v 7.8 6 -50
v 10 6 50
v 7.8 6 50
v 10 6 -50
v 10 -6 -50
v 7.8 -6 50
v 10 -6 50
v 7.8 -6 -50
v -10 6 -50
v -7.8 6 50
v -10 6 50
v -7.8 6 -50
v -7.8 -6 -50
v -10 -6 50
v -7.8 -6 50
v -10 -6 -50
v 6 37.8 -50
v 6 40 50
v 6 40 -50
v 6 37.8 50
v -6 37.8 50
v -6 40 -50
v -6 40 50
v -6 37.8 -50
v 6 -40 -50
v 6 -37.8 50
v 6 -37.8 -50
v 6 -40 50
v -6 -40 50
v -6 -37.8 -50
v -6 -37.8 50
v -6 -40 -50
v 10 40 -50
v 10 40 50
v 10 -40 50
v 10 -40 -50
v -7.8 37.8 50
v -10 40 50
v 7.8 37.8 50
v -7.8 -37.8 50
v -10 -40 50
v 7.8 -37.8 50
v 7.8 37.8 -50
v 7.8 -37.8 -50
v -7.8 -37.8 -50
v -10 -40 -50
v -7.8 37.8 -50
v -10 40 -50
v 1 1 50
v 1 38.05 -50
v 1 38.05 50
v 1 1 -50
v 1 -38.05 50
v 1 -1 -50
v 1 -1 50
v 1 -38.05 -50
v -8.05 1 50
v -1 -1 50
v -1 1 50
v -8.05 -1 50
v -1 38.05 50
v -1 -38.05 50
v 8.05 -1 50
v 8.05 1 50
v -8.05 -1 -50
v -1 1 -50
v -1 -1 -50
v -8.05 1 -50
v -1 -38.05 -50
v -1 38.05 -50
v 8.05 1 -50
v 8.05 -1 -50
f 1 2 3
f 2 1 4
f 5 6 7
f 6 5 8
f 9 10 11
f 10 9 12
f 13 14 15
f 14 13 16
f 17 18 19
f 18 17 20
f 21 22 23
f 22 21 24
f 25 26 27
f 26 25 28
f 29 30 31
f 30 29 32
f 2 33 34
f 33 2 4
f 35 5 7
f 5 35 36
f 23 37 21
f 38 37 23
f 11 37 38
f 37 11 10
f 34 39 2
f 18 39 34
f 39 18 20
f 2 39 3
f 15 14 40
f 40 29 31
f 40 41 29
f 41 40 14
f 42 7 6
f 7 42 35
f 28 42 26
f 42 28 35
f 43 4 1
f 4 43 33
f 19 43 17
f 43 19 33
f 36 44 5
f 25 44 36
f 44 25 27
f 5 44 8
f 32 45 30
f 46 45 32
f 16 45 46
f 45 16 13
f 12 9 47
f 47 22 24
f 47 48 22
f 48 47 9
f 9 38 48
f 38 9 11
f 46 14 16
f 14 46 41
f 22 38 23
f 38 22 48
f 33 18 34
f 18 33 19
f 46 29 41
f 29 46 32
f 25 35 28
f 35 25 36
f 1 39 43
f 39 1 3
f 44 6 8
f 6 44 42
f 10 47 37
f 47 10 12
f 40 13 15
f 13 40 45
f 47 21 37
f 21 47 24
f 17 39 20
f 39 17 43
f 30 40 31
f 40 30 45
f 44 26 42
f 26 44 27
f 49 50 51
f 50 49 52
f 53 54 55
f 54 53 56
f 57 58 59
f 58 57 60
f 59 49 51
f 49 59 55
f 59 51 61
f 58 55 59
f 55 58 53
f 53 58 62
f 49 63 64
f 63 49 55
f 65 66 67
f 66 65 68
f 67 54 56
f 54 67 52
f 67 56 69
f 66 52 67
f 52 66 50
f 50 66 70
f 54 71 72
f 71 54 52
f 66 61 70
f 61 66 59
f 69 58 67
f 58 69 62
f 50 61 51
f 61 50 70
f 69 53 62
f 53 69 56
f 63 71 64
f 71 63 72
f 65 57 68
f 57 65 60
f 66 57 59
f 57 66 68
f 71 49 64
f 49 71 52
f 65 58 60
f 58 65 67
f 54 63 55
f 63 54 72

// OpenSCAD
// 20x80 aluminium T-slot extrusion (approximate standard profile)
// Cross-section: 20mm x 80mm, Length: 100mm
// One connected solid, no floating parts.

$fn = 96;

// Parameters (mm)
W = 20.0;     // overall width (X)
H = 80.0;     // overall height (Y)
L = 100.0;    // length (Z)

wall = 2.2;          // outer wall thickness
slot_open = 6.0;     // slot mouth opening
slot_depth = 8.0;    // depth from outer face to inner cavity
slot_cavity_w = 12.0;// undercut cavity width
slot_cavity_d = 4.0; // additional depth for cavity beyond slot_depth

center_bore_d = 6.0; // center bore diameter

web = 2.0;           // internal web thickness
overlap = 0.25;      // boolean overlap

// ---- Helpers ----
module slot_cut_x(sign=1) {
    // Cuts a T-slot on the +/-X face, running along Z
    // Mouth (narrow)
    translate([sign*(W/2 - slot_depth/2 + overlap/2), 0, 0])
        cube([slot_depth + overlap, slot_open, L + 2*overlap], center=true);

    // Undercut cavity (wide)
    translate([sign*(W/2 - (slot_depth + slot_cavity_d)/2 + overlap/2), 0, 0])
        cube([slot_depth + slot_cavity_d + overlap, slot_cavity_w, L + 2*overlap], center=true);
}

module slot_cut_y(sign=1) {
    // Cuts a T-slot on the +/-Y face, running along Z
    translate([0, sign*(H/2 - slot_depth/2 + overlap/2), 0])
        cube([slot_open, slot_depth + overlap, L + 2*overlap], center=true);

    translate([0, sign*(H/2 - (slot_depth + slot_cavity_d)/2 + overlap/2), 0])
        cube([slot_cavity_w, slot_depth + slot_cavity_d + overlap, L + 2*overlap], center=true);
}

// ---- Main profile ----
module extrusion_20x80() {
    // Build as a single unioned solid: (outer shell minus cuts) + internal webs
    union() {
        difference() {
            // Outer body (ensures visible outer rectangular boundary)
            cube([W, H, L], center=true);

            // Inner void (keeps outer walls)
            cube([W - 2*wall, H - 2*wall, L + 2*overlap], center=true);

            // T-slots on all four faces
            slot_cut_x( 1);
            slot_cut_x(-1);
            slot_cut_y( 1);
            slot_cut_y(-1);

            // Center bore
            cylinder(d=center_bore_d, h=L + 2*overlap, center=true);
        }

        // Internal webs (overlap slightly into shell so everything is one connected manifold)
        cube([web, H - 2*wall + 2*overlap, L], center=true); // vertical web
        cube([W - 2*wall + 2*overlap, web, L], center=true); // horizontal web
    }
}

// Render
color("Silver") extrusion_20x80();
